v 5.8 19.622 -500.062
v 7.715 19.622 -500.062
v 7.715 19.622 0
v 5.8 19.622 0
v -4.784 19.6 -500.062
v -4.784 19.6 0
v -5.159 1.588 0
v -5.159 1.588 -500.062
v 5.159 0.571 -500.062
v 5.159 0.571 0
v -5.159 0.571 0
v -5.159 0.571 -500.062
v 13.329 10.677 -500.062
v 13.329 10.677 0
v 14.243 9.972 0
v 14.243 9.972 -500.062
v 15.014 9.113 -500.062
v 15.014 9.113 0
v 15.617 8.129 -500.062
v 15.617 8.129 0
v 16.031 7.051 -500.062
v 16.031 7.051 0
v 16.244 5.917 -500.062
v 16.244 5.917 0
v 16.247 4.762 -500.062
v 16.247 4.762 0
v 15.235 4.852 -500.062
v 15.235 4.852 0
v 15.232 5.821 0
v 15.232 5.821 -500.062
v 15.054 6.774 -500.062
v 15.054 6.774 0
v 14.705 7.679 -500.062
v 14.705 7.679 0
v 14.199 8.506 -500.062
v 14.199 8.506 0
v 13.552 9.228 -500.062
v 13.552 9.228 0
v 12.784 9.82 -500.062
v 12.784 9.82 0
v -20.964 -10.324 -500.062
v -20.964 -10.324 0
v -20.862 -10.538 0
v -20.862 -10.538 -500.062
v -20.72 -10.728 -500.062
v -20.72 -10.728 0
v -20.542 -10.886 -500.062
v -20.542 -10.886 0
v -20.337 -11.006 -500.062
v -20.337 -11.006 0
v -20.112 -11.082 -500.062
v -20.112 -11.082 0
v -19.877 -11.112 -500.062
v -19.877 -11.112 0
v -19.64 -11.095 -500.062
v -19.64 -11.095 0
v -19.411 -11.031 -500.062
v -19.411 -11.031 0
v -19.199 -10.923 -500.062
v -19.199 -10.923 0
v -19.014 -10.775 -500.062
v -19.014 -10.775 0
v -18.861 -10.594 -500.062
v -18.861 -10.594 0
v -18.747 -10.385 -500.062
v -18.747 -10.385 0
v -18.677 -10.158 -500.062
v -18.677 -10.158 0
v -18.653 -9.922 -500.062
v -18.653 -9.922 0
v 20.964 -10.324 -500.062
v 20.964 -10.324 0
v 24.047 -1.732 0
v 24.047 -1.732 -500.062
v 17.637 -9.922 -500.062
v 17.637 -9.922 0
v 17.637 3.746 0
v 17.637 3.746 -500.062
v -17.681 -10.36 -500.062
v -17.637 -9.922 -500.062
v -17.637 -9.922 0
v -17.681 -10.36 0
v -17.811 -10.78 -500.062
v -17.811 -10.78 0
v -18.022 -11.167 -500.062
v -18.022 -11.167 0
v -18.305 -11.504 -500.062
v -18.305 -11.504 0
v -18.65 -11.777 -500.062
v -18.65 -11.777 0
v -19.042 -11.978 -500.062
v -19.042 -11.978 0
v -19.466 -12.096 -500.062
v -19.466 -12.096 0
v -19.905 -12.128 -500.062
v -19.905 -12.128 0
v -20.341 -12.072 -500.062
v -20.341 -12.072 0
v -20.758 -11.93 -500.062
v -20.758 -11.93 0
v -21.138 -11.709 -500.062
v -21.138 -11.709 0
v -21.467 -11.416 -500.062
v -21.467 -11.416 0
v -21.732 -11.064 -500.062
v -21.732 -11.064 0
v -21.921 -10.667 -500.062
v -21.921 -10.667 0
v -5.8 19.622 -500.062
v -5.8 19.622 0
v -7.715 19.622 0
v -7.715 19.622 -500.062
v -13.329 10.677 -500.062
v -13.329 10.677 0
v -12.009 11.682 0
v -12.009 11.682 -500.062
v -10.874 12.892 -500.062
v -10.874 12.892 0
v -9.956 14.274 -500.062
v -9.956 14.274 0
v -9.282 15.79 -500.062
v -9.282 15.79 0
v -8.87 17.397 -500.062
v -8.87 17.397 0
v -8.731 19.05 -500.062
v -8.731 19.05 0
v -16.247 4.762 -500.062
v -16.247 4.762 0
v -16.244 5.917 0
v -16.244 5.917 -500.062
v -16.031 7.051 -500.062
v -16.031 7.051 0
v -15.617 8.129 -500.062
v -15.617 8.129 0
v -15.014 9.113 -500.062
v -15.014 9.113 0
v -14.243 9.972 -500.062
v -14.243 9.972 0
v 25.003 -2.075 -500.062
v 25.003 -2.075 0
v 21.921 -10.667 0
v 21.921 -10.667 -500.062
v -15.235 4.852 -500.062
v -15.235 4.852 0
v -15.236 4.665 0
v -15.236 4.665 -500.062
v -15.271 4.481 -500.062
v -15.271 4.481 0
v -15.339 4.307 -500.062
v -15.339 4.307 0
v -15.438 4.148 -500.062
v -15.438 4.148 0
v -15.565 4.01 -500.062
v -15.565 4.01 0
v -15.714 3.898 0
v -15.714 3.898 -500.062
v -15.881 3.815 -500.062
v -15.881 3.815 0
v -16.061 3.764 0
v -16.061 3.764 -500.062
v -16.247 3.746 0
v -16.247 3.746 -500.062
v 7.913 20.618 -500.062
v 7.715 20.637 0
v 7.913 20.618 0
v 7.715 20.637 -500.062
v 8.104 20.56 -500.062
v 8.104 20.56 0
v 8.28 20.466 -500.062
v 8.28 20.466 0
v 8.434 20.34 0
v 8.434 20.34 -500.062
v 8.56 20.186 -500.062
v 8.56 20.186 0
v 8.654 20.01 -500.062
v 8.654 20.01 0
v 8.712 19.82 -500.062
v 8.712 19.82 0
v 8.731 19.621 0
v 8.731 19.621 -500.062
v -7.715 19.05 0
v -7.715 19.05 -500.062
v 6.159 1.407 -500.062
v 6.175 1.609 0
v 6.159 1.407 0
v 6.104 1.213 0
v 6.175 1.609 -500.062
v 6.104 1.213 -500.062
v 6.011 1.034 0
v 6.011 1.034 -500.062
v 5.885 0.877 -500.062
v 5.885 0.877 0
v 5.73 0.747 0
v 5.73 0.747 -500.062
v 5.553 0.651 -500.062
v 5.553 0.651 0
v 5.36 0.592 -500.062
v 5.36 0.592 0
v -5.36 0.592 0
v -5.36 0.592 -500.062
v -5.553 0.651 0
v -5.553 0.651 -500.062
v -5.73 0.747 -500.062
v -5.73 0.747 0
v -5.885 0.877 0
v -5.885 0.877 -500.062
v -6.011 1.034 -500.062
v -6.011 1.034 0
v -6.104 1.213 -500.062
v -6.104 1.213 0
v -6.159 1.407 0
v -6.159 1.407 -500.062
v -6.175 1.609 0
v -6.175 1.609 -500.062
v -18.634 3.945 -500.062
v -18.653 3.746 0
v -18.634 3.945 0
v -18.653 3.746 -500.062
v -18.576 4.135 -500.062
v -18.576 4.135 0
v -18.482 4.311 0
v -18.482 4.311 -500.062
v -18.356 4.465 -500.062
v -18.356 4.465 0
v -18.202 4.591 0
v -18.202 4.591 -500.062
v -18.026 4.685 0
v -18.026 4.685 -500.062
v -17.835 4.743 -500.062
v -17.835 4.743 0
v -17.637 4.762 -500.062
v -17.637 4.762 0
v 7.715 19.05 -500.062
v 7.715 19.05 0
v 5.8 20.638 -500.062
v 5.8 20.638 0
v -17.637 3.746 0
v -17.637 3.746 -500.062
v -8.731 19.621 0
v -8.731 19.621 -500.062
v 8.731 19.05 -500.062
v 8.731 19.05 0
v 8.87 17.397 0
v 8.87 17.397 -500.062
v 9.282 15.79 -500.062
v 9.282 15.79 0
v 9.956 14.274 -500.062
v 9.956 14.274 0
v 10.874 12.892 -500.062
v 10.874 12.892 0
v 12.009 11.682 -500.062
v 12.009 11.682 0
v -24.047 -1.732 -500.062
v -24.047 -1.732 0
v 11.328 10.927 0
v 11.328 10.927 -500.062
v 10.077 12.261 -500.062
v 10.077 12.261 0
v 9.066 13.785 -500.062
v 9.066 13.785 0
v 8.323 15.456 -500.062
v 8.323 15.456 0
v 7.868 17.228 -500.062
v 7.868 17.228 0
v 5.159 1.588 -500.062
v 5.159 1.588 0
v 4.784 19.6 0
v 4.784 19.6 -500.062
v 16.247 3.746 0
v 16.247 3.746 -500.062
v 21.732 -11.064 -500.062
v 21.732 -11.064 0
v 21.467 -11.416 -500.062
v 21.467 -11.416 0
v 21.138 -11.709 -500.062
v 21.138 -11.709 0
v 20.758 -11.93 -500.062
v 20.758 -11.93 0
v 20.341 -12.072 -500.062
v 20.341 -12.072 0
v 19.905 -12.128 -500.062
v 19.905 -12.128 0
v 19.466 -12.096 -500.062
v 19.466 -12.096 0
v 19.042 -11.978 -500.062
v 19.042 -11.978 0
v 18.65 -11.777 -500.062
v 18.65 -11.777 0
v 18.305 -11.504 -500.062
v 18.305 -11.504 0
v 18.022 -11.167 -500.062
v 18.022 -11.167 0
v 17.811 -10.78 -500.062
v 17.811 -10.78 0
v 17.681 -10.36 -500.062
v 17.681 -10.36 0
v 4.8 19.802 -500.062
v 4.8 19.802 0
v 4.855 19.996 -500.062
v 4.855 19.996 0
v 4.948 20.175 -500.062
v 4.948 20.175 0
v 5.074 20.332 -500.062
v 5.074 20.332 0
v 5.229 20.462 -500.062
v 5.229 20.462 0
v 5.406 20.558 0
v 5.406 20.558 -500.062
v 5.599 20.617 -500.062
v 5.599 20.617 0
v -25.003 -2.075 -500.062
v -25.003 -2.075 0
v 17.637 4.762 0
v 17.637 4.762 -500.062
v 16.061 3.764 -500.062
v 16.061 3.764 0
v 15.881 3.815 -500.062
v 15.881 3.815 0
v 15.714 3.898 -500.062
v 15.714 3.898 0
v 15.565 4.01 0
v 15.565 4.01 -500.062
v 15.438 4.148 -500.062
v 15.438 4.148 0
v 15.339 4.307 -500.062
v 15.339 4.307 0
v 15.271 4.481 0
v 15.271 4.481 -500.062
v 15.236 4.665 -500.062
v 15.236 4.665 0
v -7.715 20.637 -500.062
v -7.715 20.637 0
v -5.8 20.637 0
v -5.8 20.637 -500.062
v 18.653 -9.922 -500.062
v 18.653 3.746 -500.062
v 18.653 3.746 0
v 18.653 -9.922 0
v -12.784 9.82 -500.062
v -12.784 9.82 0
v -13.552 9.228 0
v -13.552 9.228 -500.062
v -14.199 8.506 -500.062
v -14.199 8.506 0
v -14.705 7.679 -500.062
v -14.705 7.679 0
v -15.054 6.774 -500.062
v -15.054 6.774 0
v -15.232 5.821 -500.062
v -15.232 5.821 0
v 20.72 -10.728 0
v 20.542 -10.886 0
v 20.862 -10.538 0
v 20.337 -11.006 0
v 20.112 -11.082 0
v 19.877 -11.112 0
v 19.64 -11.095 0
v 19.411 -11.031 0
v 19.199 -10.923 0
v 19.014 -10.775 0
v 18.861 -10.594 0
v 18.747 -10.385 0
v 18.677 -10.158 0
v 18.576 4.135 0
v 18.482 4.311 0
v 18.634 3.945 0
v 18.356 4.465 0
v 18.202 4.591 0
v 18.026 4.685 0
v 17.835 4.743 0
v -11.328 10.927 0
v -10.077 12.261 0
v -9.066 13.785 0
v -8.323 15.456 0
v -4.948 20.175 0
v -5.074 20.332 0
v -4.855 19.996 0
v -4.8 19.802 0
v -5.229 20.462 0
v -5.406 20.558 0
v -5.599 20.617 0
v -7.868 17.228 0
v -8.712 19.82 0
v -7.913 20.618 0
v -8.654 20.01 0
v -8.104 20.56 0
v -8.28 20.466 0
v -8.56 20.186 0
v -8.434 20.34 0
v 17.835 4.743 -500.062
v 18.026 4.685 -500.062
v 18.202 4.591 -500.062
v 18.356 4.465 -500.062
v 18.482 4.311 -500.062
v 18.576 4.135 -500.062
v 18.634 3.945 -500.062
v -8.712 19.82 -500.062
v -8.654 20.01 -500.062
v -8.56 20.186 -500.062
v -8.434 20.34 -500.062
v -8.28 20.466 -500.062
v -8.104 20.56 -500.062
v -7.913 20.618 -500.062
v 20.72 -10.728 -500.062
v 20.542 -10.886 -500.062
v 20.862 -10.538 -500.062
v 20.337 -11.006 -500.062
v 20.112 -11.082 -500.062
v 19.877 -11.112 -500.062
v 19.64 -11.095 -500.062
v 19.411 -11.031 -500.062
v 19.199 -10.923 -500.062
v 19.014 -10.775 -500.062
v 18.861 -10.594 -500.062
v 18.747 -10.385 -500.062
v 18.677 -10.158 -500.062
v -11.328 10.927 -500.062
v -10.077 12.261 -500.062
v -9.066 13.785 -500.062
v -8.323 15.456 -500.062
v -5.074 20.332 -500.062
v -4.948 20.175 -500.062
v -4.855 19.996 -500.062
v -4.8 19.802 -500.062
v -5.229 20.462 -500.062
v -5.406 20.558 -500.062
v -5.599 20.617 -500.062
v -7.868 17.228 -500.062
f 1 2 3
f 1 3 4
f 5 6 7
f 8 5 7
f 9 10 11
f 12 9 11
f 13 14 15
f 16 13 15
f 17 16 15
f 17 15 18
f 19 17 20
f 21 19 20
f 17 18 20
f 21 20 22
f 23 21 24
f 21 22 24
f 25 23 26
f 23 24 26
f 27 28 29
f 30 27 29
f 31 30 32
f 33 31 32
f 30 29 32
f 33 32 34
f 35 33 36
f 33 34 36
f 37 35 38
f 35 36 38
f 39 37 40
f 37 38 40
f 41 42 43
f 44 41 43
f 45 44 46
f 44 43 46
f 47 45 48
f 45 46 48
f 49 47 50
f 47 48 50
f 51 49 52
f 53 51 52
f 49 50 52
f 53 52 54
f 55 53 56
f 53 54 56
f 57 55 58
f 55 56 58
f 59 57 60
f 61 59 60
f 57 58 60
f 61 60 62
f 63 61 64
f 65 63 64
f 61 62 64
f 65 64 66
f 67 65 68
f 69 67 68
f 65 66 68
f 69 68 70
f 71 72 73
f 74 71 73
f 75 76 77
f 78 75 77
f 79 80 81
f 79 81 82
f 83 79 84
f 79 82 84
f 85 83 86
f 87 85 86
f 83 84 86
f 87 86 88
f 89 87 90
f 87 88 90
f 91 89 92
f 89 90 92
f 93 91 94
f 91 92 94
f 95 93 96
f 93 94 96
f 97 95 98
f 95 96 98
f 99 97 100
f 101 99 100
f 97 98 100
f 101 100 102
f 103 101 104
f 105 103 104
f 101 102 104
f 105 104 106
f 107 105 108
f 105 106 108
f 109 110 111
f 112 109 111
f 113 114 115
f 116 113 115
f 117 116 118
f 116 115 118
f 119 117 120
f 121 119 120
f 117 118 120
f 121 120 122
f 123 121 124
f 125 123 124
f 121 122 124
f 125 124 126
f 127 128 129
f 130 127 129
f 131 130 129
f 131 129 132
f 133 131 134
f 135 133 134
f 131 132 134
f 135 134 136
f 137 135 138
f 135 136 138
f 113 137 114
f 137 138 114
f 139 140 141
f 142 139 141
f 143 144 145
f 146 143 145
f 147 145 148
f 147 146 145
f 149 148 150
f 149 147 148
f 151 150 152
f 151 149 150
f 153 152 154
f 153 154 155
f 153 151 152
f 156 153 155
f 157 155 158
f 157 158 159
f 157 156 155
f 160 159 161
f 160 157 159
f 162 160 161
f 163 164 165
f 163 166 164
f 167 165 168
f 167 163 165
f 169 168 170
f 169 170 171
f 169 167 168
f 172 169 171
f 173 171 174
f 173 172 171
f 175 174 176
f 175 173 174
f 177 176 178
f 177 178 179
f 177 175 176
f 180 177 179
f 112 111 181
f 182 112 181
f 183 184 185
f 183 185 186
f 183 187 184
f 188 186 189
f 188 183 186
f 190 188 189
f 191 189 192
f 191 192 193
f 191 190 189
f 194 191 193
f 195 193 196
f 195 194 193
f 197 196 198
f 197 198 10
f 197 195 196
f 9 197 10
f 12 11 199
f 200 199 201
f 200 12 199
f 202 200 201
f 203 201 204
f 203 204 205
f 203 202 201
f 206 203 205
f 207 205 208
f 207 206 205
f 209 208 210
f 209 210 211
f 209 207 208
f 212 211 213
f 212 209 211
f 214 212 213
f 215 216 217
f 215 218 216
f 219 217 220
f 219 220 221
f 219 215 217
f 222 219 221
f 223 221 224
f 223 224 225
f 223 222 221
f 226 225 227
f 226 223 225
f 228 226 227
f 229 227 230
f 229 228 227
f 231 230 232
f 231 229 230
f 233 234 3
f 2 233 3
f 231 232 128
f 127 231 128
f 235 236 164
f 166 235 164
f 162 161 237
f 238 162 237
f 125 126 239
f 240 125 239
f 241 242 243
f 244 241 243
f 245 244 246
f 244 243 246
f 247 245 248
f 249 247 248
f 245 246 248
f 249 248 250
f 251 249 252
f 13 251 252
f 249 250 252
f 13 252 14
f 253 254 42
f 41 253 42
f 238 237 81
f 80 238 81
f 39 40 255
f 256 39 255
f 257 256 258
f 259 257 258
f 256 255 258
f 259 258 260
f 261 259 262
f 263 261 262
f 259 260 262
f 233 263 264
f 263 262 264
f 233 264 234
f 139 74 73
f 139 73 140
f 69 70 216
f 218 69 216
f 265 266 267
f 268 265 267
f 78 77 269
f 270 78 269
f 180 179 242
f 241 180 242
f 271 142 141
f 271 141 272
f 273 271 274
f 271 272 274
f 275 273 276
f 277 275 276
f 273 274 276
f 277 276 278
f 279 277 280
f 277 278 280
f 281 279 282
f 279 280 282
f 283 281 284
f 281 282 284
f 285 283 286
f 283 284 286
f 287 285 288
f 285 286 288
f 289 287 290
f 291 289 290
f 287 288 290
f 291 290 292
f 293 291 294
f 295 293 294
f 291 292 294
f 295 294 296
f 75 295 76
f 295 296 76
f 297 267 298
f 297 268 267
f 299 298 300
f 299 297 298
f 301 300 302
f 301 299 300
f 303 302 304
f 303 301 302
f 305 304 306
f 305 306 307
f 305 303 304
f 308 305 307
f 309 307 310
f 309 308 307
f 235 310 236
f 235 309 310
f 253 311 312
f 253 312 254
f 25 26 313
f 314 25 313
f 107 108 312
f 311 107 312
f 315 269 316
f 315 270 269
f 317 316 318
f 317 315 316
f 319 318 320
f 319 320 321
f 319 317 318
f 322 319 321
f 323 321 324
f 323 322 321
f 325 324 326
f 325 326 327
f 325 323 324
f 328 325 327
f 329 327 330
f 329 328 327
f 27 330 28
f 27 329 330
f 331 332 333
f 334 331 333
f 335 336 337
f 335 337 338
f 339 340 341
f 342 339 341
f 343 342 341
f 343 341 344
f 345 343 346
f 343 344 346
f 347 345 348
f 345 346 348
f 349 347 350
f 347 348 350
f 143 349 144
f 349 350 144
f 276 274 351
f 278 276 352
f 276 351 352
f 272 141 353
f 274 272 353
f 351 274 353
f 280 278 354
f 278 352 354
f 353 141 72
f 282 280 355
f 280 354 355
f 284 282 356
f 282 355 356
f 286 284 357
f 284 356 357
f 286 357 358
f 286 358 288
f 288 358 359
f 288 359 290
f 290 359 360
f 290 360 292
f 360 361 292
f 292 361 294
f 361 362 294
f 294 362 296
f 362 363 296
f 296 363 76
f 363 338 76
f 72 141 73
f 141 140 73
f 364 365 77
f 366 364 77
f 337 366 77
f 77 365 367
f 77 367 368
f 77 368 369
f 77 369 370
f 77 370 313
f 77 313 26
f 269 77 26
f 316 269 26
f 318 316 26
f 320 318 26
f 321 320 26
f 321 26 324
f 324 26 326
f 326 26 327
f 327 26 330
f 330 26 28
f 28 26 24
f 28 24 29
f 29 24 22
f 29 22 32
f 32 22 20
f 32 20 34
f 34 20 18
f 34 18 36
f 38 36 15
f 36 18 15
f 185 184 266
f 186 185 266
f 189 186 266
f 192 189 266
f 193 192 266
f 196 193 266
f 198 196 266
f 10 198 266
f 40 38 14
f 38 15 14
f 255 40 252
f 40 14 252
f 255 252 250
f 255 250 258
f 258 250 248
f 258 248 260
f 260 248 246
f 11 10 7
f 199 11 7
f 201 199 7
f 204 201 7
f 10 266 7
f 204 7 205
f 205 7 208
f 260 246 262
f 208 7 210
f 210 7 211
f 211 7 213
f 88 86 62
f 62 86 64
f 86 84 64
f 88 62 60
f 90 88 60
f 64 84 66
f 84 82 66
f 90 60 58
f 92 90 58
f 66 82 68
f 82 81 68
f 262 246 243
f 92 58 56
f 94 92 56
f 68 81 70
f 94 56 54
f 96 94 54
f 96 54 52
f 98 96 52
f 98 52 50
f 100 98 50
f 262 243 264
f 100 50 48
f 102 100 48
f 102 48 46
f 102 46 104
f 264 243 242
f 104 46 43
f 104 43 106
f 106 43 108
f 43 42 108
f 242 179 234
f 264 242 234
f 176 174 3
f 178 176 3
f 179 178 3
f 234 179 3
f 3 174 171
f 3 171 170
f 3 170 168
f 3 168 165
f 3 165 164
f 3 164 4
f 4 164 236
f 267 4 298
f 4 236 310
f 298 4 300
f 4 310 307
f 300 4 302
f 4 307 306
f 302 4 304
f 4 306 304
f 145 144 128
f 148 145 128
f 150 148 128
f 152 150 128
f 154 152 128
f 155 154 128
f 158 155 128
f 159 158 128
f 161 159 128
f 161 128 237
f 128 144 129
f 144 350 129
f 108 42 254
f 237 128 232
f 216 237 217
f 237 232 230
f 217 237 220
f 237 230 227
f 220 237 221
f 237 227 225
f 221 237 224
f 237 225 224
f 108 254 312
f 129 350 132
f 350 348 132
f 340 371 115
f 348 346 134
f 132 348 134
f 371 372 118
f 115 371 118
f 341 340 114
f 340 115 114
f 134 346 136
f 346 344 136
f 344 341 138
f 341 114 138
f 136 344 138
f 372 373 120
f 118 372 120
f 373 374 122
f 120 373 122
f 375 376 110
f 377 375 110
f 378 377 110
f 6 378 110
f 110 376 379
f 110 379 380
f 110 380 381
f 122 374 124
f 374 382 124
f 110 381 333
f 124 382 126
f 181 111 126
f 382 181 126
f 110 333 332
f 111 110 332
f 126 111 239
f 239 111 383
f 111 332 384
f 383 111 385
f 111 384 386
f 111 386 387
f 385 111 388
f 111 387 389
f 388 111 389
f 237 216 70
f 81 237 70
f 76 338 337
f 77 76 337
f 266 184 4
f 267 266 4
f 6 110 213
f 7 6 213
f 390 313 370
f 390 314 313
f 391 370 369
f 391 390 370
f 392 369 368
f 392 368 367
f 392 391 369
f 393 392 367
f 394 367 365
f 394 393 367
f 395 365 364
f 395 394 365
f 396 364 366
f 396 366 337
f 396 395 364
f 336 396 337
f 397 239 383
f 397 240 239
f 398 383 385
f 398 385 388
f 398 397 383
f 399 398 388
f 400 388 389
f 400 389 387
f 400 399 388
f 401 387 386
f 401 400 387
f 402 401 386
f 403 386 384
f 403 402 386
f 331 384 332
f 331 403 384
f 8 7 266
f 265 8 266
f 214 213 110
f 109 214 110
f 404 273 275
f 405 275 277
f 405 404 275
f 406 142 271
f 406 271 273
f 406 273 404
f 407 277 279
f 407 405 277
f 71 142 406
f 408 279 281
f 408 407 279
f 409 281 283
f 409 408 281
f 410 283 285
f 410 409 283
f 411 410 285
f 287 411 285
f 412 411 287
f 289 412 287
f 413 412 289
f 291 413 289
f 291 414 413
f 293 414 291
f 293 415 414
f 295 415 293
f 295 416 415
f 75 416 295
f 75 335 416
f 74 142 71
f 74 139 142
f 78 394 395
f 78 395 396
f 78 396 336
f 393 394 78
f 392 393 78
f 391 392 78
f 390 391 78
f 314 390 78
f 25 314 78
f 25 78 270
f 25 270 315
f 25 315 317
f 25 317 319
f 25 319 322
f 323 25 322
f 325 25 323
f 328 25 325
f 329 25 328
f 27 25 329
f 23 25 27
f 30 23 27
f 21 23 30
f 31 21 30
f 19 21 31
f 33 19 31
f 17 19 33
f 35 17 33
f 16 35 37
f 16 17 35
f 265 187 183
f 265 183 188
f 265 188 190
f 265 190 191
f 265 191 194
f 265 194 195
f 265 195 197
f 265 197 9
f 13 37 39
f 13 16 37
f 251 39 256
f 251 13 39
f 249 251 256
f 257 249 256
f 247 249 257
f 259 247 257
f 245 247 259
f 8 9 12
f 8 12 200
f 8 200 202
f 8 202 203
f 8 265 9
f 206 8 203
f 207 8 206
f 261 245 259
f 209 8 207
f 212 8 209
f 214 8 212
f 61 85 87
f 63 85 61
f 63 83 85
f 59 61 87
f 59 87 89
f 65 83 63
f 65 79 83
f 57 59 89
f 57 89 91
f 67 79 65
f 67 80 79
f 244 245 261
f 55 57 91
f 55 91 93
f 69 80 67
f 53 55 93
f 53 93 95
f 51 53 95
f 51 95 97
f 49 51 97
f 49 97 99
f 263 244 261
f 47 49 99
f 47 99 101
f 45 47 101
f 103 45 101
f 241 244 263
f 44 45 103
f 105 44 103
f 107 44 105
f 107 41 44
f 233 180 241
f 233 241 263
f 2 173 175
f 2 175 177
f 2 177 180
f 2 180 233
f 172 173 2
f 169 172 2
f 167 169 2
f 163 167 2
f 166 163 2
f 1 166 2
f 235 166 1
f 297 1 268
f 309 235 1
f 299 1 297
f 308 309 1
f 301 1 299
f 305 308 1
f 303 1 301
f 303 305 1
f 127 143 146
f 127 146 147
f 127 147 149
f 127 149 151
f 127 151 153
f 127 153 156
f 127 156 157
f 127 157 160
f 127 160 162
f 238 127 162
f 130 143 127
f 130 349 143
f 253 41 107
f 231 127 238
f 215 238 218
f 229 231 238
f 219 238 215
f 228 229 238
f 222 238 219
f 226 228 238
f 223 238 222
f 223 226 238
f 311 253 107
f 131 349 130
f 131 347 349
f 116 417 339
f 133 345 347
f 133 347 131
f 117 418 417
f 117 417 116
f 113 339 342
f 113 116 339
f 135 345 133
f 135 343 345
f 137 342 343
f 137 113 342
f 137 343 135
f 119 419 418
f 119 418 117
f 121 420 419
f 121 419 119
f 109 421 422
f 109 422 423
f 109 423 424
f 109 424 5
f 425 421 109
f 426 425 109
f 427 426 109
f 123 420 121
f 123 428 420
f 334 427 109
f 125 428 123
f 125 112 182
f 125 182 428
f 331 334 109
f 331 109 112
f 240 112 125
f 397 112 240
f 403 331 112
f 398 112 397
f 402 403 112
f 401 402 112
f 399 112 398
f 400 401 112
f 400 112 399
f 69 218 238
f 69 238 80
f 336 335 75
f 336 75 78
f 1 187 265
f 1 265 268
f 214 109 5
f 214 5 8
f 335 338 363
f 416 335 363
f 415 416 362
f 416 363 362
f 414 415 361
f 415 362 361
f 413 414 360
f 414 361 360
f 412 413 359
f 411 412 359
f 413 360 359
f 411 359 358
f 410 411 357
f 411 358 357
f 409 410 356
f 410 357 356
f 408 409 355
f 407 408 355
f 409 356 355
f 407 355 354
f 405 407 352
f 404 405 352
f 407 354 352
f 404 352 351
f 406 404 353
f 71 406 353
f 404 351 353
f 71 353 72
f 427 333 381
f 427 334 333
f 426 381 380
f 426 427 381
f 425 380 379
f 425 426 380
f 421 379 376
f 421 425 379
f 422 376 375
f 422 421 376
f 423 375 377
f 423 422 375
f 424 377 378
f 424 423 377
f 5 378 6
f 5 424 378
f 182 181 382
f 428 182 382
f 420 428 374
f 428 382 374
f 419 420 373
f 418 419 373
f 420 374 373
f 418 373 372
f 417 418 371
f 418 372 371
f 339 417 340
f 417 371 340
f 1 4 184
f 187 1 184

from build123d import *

# Parameters (mm, degrees)
EXTRUDE_THIN1_DEPTH = 500.0625
FILLET1_R           = 1.016


with BuildPart() as part:
    # Sketch1 → Extrude-Thin1 (new body)
    with BuildSketch(Plane.XY):
        with BuildLine():
            Line((-24.046802967, -1.731966596), (-20.964439882, -10.323922359))
            ThreePointArc((-20.964439882, -10.323922359), (-19.639707725, -11.09488593), (-18.653125, -9.921875))
            Line((-18.653125, -9.921875), (-18.653125, 4.7625))
            Line((-18.653125, 4.7625), (-16.247439028, 4.7625))
            ThreePointArc((-16.247439028, 4.7625), (-15.61651691, 8.128589514), (-13.329192073, 10.677465037))
            ThreePointArc((-13.329192073, 10.677465037), (-9.956372718, 14.274007616), (-8.73125, 19.05))
            Line((-8.73125, 19.05), (-8.73125, 20.6375))
            Line((-8.73125, 20.6375), (-4.7625, 20.6375))
            Line((-4.7625, 20.6375), (-5.159375, 1.5875))
            Line((-5.159375, 1.5875), (5.159375, 1.5875))
            Line((5.159375, 1.5875), (4.7625, 20.6375))
            Line((4.7625, 20.6375), (8.73125, 20.6375))
            Line((8.73125, 20.6375), (8.73125, 19.05))
            ThreePointArc((8.73125, 19.05), (9.956372718, 14.274007616), (13.329192073, 10.677465037))
            ThreePointArc((13.329192073, 10.677465037), (15.61651691, 8.128589514), (16.247439028, 4.7625))
            Line((16.247439028, 4.7625), (18.653125, 4.7625))
            Line((18.653125, 4.7625), (18.653125, -9.921875))
            ThreePointArc((18.653125, -9.921875), (19.639707725, -11.09488593), (20.964439882, -10.323922359))
            Line((20.964439882, -10.323922359), (24.046802967, -1.731966596))
            Line((24.046802967, -1.731966596), (25.003125, -2.075047009))
            Line((25.003125, -2.075047009), (21.920761915, -10.667002772))
            ThreePointArc((21.920761915, -10.667002772), (19.465591651, -12.095855256), (17.637125, -9.921875))
            Line((17.637125, -9.921875), (17.637125, 3.7465))
            Line((17.637125, 3.7465), (15.018802072, 3.7465))
            ThreePointArc((15.018802072, 3.7465), (14.927763498, 7.160953719), (12.784021341, 9.820117457))
            ThreePointArc((12.784021341, 9.820117457), (9.065825284, 13.784945996), (7.71525, 19.05))
            Line((7.71525, 19.05), (7.71525, 19.6215))
            Line((7.71525, 19.6215), (5.799887129, 19.6215))
            Line((5.799887129, 19.6215), (6.196762129, 0.5715))
            Line((6.196762129, 0.5715), (-6.196762129, 0.5715))
            Line((-6.196762129, 0.5715), (-5.799887129, 19.6215))
            Line((-5.799887129, 19.6215), (-7.71525, 19.6215))
            Line((-7.71525, 19.6215), (-7.71525, 19.05))
            ThreePointArc((-7.71525, 19.05), (-9.065825284, 13.784945996), (-12.784021341, 9.820117457))
            ThreePointArc((-12.784021341, 9.820117457), (-14.927763498, 7.160953719), (-15.018802072, 3.7465))
            Line((-15.018802072, 3.7465), (-17.637125, 3.7465))
            Line((-17.637125, 3.7465), (-17.637125, -9.921875))
            ThreePointArc((-17.637125, -9.921875), (-19.465591651, -12.095855256), (-21.920761915, -10.667002772))
            Line((-21.920761915, -10.667002772), (-25.003125, -2.075047009))
            Line((-25.003125, -2.075047009), (-24.046802967, -1.731966596))
        make_face()
    extrude(amount=-EXTRUDE_THIN1_DEPTH)

    # Fillet1
    fillet1_edges = [part.edges().sort_by_distance(p)[0] for p in [
        (-18.653125, 4.7625, -250.03125),
        (-8.73125, 20.6375, -250.03125),
        (-4.7625, 20.6375, -250.03125),
        (4.7625, 20.6375, -250.03125),
        (8.73125, 20.6375, -250.03125),
        (18.653125, 4.7625, -250.03125),
        (15.018802072, 3.7465, -250.03125),
        (6.196762129, 0.5715, -250.03125),
        (-6.196762129, 0.5715, -250.03125),
        (-15.018802072, 3.7465, -250.03125),
    ]]
    fillet(fillet1_edges, radius=FILLET1_R)


solid = part.part
